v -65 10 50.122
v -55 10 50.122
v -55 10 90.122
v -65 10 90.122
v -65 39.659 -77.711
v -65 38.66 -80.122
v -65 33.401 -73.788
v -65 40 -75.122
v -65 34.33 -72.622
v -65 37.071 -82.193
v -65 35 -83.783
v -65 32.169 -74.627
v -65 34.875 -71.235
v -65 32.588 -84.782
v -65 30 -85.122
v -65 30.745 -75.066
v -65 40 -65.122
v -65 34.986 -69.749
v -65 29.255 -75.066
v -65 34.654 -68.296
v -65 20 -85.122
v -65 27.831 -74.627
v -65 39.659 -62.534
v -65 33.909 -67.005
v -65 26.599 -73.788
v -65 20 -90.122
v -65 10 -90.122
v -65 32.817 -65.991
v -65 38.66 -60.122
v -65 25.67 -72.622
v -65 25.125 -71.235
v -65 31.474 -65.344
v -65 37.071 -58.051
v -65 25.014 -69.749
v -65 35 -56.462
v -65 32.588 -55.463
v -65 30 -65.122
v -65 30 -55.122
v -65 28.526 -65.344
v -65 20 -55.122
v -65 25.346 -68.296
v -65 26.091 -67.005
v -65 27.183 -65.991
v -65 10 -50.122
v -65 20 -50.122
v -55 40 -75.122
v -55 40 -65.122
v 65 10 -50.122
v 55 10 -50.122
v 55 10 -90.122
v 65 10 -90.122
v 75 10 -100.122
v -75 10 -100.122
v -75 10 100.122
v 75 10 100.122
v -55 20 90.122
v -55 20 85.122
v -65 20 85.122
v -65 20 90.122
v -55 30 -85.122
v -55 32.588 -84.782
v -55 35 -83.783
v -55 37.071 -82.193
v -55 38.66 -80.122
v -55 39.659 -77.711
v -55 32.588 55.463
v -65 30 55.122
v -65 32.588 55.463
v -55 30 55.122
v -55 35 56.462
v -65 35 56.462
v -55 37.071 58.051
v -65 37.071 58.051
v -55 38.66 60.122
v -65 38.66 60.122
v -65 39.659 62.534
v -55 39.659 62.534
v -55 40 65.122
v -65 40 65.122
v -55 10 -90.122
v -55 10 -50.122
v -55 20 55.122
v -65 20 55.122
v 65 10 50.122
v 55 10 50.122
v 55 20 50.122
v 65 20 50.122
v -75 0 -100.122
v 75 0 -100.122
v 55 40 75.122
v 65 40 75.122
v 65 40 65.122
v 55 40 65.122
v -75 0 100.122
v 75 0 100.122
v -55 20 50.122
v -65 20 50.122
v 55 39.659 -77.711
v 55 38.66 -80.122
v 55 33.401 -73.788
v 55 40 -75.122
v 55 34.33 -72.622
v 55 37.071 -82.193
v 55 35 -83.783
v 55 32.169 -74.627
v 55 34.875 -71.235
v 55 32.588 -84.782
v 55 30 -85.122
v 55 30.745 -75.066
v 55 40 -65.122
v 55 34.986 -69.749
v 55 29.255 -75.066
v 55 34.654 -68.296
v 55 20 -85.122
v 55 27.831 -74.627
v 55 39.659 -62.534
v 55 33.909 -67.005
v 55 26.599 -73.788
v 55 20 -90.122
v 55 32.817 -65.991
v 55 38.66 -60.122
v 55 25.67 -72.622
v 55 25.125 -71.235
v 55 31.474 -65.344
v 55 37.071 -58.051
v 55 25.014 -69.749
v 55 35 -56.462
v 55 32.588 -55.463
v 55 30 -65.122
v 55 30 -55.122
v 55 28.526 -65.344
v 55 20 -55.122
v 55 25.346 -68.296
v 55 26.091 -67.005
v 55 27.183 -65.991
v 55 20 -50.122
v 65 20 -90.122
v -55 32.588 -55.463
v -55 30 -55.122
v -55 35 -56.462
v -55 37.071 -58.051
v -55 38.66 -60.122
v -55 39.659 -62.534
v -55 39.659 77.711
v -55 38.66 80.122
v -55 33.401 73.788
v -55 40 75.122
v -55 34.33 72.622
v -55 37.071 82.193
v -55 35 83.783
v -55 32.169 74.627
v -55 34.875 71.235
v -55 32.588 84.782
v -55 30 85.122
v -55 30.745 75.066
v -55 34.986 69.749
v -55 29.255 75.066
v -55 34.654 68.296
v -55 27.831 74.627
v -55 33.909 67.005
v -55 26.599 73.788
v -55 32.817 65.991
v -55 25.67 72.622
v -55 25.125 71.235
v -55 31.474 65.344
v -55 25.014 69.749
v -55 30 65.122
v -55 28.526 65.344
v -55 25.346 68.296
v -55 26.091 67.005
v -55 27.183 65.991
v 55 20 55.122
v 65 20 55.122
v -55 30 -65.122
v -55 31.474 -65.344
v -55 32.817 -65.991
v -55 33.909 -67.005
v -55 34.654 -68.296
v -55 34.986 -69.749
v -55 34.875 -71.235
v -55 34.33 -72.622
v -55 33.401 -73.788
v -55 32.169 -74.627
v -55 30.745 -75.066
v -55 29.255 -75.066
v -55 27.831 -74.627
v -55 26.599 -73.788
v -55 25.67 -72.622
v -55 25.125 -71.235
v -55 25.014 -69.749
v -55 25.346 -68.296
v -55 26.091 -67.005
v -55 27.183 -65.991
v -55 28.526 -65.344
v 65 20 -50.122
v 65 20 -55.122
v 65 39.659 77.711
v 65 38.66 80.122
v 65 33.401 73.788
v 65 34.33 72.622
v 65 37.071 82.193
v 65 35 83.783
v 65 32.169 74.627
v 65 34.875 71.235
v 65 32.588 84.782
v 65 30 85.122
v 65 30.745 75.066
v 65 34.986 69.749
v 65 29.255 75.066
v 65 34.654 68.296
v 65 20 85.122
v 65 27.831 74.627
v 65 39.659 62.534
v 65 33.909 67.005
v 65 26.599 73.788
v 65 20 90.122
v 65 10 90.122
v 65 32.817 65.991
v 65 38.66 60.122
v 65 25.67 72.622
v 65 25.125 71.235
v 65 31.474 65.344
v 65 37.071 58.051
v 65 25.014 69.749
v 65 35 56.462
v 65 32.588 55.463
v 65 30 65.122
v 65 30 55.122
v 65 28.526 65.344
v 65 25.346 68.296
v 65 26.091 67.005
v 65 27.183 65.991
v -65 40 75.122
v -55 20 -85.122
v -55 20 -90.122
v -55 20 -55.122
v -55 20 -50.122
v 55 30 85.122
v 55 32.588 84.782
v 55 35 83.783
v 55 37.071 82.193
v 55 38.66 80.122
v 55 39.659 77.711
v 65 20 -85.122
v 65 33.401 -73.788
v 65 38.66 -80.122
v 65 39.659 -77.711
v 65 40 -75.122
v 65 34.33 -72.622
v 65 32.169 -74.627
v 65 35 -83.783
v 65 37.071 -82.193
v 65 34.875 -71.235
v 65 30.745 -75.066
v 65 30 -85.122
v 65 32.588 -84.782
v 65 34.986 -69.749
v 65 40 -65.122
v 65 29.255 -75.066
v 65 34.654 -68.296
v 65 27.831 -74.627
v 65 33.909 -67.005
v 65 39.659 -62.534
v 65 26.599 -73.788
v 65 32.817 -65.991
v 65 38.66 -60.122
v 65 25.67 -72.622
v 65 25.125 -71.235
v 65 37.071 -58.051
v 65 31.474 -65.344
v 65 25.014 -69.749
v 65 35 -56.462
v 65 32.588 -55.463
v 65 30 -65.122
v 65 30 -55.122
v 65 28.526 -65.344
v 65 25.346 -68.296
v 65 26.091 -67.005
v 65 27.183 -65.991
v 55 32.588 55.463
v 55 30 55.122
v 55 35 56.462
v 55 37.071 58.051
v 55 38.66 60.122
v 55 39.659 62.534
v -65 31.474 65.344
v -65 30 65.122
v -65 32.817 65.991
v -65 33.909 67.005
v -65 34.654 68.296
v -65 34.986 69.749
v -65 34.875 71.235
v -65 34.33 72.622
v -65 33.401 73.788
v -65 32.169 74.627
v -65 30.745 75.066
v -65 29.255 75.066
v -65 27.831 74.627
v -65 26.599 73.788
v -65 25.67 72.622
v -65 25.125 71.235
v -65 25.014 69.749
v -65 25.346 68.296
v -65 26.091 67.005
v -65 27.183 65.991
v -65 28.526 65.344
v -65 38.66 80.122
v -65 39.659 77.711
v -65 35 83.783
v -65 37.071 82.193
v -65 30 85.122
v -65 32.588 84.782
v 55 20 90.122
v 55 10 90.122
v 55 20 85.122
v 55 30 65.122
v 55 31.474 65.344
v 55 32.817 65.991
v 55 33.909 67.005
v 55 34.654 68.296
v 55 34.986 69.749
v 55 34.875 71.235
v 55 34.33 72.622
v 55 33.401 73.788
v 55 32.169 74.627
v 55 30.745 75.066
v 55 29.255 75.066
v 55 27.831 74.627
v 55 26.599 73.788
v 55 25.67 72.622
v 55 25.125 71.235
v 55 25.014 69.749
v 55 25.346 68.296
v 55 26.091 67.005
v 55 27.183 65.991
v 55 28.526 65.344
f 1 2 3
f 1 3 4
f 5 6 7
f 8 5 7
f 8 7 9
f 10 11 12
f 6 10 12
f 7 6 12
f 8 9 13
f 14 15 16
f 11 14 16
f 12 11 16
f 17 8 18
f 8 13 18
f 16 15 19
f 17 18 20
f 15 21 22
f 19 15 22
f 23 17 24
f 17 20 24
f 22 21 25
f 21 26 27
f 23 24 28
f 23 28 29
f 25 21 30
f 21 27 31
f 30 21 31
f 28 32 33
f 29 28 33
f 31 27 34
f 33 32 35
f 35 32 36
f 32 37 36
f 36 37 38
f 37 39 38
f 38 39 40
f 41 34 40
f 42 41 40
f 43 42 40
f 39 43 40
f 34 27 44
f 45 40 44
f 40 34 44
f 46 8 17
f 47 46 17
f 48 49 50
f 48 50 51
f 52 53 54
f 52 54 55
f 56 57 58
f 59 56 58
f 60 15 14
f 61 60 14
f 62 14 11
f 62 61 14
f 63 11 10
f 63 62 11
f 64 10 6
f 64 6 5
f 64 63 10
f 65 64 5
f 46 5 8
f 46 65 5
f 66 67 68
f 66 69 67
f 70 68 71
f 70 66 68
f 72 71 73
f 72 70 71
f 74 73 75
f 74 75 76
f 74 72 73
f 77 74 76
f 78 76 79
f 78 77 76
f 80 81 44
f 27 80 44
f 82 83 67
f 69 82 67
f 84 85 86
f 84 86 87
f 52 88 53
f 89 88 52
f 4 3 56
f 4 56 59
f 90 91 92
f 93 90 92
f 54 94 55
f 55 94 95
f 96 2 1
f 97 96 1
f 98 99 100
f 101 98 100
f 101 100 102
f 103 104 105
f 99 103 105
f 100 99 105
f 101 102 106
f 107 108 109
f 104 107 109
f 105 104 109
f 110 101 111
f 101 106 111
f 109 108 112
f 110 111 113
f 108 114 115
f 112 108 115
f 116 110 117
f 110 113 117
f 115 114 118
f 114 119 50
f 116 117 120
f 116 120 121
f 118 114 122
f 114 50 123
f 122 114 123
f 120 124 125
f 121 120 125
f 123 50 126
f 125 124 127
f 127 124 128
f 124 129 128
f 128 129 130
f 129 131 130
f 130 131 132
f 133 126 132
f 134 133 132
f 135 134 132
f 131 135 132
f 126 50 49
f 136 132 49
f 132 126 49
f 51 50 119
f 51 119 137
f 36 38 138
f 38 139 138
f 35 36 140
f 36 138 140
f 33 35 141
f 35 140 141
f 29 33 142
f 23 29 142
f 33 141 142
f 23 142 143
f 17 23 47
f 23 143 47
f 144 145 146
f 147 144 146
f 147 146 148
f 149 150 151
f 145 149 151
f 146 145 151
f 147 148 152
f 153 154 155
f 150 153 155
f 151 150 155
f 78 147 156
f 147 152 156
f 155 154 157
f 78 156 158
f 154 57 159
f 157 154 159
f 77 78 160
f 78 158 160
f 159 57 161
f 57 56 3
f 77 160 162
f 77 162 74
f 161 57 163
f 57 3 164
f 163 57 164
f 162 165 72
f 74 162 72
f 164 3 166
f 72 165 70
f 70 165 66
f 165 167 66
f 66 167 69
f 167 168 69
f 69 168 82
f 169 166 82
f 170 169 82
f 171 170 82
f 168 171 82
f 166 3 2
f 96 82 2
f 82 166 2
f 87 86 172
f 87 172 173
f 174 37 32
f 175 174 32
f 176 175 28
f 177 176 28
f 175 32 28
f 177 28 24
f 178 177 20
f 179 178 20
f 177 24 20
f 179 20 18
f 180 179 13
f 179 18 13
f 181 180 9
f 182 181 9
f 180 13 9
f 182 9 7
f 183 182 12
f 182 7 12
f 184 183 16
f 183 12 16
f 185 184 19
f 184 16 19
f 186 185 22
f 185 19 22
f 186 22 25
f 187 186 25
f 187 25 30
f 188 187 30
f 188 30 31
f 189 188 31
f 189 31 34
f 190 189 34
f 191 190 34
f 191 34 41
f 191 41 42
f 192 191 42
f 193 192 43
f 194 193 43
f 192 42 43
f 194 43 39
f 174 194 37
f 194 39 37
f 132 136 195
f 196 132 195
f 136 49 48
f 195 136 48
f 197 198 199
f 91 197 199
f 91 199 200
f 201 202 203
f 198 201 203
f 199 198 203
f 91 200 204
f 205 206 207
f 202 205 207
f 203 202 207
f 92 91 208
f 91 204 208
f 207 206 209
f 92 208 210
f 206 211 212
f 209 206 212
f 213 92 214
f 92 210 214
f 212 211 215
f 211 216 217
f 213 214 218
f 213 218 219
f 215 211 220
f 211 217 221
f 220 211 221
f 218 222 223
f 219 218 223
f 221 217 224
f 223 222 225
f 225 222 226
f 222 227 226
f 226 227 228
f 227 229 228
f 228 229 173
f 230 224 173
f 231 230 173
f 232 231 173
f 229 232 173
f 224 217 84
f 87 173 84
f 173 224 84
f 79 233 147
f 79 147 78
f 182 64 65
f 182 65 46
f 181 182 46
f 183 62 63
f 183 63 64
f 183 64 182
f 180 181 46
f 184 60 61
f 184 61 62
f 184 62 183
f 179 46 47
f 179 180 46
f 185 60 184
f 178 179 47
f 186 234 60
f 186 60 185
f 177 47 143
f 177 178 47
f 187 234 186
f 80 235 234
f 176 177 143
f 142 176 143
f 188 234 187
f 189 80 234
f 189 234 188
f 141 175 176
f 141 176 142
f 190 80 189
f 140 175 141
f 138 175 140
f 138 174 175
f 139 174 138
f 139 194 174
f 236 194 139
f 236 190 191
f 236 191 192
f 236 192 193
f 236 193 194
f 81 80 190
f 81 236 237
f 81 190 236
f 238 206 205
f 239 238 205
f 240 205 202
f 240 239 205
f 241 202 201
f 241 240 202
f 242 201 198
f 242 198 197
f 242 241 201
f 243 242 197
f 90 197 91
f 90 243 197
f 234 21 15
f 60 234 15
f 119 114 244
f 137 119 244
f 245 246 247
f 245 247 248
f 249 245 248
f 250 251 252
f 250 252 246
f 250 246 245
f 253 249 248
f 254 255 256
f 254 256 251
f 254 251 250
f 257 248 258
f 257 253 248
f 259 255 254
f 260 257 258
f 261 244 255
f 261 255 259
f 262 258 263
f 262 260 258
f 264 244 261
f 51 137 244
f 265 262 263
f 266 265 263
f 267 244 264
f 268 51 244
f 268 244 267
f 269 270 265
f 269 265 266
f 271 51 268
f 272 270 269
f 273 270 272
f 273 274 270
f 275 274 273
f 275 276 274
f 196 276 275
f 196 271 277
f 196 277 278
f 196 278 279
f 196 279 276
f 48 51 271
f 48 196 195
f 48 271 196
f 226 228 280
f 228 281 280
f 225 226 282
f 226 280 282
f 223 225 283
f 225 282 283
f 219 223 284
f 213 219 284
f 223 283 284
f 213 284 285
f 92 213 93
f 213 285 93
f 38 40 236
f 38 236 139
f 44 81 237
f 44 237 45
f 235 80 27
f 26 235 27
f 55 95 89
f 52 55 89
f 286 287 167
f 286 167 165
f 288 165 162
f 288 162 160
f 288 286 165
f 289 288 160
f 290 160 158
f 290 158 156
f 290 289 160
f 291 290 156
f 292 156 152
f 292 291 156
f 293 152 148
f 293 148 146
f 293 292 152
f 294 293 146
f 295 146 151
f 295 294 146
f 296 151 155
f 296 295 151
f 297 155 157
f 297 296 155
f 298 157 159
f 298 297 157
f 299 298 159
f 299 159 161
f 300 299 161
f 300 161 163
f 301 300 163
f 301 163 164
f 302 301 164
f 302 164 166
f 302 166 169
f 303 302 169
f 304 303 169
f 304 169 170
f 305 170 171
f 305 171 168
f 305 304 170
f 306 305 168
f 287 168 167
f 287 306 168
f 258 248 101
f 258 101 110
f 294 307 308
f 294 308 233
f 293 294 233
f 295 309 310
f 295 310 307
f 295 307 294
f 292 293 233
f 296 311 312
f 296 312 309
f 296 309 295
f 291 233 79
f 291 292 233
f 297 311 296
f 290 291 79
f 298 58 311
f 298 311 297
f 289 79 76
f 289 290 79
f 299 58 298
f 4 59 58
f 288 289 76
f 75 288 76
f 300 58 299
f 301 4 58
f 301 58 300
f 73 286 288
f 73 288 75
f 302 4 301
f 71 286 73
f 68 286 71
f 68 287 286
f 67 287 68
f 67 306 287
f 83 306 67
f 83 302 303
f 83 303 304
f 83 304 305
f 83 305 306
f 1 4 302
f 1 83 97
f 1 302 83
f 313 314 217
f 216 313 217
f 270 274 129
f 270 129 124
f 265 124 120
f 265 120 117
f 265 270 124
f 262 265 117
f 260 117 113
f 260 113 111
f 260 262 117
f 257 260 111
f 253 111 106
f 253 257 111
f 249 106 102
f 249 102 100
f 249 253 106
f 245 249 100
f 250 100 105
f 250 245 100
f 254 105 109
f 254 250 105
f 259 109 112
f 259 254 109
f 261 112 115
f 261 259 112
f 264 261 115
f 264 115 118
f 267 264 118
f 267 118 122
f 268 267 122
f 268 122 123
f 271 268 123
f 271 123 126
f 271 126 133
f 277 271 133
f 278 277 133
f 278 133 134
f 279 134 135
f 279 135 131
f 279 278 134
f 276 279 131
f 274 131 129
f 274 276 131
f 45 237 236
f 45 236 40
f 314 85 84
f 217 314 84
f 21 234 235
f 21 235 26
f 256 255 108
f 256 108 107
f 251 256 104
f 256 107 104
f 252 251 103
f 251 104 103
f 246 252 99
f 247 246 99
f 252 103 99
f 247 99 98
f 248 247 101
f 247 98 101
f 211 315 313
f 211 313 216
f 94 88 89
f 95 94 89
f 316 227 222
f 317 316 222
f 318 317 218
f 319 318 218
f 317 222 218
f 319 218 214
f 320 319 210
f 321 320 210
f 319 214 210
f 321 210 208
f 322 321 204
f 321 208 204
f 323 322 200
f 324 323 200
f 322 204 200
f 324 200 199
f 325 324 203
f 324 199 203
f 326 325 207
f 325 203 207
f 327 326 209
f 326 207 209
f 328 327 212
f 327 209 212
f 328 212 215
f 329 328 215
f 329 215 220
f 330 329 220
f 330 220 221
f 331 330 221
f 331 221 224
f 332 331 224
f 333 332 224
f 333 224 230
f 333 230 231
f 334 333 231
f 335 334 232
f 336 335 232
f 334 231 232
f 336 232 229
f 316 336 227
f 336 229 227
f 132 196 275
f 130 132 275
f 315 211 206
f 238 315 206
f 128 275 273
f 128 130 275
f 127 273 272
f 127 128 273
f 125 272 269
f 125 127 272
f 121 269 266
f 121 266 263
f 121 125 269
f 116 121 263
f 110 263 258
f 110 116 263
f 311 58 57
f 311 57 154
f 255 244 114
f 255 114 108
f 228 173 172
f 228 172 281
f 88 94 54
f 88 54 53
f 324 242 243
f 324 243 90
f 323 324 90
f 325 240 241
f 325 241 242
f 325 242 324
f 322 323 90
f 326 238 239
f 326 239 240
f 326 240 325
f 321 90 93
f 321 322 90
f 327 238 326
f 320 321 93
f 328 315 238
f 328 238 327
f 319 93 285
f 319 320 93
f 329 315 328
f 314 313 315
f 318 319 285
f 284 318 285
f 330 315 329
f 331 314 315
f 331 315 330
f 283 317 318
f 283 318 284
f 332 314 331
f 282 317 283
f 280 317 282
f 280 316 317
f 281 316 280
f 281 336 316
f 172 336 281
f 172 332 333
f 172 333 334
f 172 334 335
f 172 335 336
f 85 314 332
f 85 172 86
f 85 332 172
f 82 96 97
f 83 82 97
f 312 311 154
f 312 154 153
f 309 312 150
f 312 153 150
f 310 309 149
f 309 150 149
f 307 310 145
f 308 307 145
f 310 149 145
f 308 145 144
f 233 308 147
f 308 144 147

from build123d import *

# Parameters (mm, degrees)
SKETCH1_W           = 150
SKETCH1_H           = 200.24463343
BOSS_EXTRUDE1_DEPTH = 10
SKETCH2_W           = 10
SKETCH2_H           = 40
BOSS_EXTRUDE2_DEPTH = 10
SKETCH4_W           = 30
SKETCH4_H           = 20
BOSS_EXTRUDE3_DEPTH = 10
FILLET1_R           = 10
SKETCH5_R           = 5
CUT_EXTRUDE2_DEPTH  = 10


with BuildPart() as part:
    # Sketch1 → Boss-Extrude1 (new body)
    with BuildSketch(Plane(origin=(0, 0, 0), x_dir=(1, 0, 0), z_dir=(0, 1, 0))):
        Rectangle(SKETCH1_W, SKETCH1_H)
    extrude(amount=BOSS_EXTRUDE1_DEPTH)


with BuildPart() as body_2:
    # Sketch2 → Boss-Extrude2 (new body)
    with BuildSketch(Plane(origin=(0, 10, 0), x_dir=(1, 0, 0), z_dir=(0, 1, 0))):
        with Locations((60, -70.122316715)):
            Rectangle(SKETCH2_W, SKETCH2_H)
    extrude(amount=BOSS_EXTRUDE2_DEPTH)


with BuildPart() as body_3:
    # Sketch4 → Boss-Extrude3 (new body)
    with BuildSketch(Plane(origin=(65, 0, 0), x_dir=(0, 0, -1), z_dir=(1, 0, 0))):
        with Locations((-70.122316715, 30)):
            Rectangle(SKETCH4_W, SKETCH4_H)
    extrude(amount=-BOSS_EXTRUDE3_DEPTH)

    # Fillet1
    fillet1_edges = [body_3.edges().sort_by_distance(p)[0] for p in [
        (60, 40, 85.122316715),
        (60, 40, 55.122316715),
    ]]
    fillet(fillet1_edges, radius=FILLET1_R)

    # Sketch5 → Cut-Extrude2 (cut)
    with BuildSketch(Plane(origin=(65, 0, 0), x_dir=(0, 0, -1), z_dir=(1, 0, 0))):
        with Locations((-70.122316715, 30)):
            Circle(SKETCH5_R)
    extrude(amount=-CUT_EXTRUDE2_DEPTH, mode=Mode.SUBTRACT)

    # Combine1: union body 2
    add(body_2.part)


with BuildPart() as body_3_2:
    # Mirror1: mirrored copy
    add(body_3.part.mirror(Plane.XY))


with BuildPart() as body_4:
    # Mirror3: mirrored copy
    add(body_3_2.part.mirror(Plane(origin=(0, 0, 0), x_dir=(0, 0, 1), z_dir=(1, 0, 0))))


with BuildPart() as body_5:
    # Mirror3 2: mirrored copy
    add(body_3.part.mirror(Plane(origin=(0, 0, 0), x_dir=(0, 0, 1), z_dir=(1, 0, 0))))


solid = Compound([part.part, body_3.part, body_3_2.part, body_4.part, body_5.part])
